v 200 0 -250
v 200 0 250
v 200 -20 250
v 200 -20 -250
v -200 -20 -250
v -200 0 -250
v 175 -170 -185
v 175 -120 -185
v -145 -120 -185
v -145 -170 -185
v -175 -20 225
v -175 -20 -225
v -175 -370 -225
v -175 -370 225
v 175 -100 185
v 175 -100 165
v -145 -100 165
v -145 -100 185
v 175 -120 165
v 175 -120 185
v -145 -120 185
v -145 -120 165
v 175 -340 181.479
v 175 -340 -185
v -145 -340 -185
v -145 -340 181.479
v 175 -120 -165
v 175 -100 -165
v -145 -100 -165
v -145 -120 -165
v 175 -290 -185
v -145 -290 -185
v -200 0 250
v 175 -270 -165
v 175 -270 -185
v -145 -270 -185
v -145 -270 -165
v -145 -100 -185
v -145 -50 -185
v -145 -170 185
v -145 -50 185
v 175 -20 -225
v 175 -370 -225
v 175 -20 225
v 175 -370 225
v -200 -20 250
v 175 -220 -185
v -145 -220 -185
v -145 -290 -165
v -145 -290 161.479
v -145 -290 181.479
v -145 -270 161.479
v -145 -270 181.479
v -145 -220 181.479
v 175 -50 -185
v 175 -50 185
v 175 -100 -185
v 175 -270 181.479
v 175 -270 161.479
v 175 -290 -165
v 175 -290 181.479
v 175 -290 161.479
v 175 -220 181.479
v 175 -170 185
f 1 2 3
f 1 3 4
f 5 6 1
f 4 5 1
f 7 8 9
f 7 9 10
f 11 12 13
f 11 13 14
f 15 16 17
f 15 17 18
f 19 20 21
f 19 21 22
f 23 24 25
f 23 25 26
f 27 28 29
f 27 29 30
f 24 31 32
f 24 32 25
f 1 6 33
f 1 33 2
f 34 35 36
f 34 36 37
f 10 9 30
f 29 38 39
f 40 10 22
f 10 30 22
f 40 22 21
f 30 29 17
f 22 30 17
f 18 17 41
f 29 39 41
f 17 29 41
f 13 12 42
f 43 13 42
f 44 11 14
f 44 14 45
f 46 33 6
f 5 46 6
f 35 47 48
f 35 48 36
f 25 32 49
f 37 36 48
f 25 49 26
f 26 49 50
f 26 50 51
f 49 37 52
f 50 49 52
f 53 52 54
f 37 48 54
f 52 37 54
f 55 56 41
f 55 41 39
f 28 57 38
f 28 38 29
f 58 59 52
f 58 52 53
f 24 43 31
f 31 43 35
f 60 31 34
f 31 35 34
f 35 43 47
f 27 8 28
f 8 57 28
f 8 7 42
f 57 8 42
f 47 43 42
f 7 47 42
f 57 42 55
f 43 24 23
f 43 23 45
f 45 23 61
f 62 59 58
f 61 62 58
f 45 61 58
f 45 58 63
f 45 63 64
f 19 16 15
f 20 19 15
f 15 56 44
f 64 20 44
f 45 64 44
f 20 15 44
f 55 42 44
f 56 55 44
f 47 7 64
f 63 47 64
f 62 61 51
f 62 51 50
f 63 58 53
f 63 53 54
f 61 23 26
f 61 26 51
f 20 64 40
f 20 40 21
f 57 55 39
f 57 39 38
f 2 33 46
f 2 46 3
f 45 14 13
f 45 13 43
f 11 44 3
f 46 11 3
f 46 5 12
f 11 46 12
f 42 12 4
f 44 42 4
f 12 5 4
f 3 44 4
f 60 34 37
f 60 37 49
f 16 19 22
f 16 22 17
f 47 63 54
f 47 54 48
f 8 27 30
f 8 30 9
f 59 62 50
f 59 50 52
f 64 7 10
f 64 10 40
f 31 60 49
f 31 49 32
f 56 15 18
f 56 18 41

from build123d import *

# Parameters (mm, degrees)
SKETCH1_W           = 400
SKETCH1_H           = 500
BOSS_EXTRUDE1_DEPTH = 20
SKETCH2_W           = 350
SKETCH2_H           = 450
BOSS_EXTRUDE2_DEPTH = 350
CUT_EXTRUDE1_DEPTH  = 320


with BuildPart() as part:
    # Sketch1 → Boss-Extrude1 (new body)
    with BuildSketch(Plane(origin=(0, 0, 0), x_dir=(1, 0, 0), z_dir=(0, 1, 0))):
        Rectangle(SKETCH1_W, SKETCH1_H)
    extrude(amount=-BOSS_EXTRUDE1_DEPTH)

    # Sketch2 → Boss-Extrude2 (add)
    with BuildSketch(Plane.XZ.offset(20)):
        Rectangle(SKETCH2_W, SKETCH2_H)
    extrude(amount=BOSS_EXTRUDE2_DEPTH)

    # Sketch3 → Cut-Extrude1 (cut)
    with BuildSketch(Plane(origin=(175, 0, 0), x_dir=(0, 0, -1), z_dir=(1, 0, 0))):
        Polygon((-185, -50), (185, -50), (185, -100), (165, -100), (165, -120), (185, -120), (185, -170), (-185, -170), (-185, -120), (-165, -120), (-165, -100), (-185, -100), align=None)
        Polygon((-181.478873239, -220), (185, -220), (185, -270), (165, -270), (165, -290), (185, -290), (185, -340), (-181.478873239, -340), (-181.478873239, -290), (-161.478873239, -290), (-161.478873239, -270), (-181.478873239, -270), align=None)
    extrude(amount=-CUT_EXTRUDE1_DEPTH, mode=Mode.SUBTRACT)


solid = part.part
